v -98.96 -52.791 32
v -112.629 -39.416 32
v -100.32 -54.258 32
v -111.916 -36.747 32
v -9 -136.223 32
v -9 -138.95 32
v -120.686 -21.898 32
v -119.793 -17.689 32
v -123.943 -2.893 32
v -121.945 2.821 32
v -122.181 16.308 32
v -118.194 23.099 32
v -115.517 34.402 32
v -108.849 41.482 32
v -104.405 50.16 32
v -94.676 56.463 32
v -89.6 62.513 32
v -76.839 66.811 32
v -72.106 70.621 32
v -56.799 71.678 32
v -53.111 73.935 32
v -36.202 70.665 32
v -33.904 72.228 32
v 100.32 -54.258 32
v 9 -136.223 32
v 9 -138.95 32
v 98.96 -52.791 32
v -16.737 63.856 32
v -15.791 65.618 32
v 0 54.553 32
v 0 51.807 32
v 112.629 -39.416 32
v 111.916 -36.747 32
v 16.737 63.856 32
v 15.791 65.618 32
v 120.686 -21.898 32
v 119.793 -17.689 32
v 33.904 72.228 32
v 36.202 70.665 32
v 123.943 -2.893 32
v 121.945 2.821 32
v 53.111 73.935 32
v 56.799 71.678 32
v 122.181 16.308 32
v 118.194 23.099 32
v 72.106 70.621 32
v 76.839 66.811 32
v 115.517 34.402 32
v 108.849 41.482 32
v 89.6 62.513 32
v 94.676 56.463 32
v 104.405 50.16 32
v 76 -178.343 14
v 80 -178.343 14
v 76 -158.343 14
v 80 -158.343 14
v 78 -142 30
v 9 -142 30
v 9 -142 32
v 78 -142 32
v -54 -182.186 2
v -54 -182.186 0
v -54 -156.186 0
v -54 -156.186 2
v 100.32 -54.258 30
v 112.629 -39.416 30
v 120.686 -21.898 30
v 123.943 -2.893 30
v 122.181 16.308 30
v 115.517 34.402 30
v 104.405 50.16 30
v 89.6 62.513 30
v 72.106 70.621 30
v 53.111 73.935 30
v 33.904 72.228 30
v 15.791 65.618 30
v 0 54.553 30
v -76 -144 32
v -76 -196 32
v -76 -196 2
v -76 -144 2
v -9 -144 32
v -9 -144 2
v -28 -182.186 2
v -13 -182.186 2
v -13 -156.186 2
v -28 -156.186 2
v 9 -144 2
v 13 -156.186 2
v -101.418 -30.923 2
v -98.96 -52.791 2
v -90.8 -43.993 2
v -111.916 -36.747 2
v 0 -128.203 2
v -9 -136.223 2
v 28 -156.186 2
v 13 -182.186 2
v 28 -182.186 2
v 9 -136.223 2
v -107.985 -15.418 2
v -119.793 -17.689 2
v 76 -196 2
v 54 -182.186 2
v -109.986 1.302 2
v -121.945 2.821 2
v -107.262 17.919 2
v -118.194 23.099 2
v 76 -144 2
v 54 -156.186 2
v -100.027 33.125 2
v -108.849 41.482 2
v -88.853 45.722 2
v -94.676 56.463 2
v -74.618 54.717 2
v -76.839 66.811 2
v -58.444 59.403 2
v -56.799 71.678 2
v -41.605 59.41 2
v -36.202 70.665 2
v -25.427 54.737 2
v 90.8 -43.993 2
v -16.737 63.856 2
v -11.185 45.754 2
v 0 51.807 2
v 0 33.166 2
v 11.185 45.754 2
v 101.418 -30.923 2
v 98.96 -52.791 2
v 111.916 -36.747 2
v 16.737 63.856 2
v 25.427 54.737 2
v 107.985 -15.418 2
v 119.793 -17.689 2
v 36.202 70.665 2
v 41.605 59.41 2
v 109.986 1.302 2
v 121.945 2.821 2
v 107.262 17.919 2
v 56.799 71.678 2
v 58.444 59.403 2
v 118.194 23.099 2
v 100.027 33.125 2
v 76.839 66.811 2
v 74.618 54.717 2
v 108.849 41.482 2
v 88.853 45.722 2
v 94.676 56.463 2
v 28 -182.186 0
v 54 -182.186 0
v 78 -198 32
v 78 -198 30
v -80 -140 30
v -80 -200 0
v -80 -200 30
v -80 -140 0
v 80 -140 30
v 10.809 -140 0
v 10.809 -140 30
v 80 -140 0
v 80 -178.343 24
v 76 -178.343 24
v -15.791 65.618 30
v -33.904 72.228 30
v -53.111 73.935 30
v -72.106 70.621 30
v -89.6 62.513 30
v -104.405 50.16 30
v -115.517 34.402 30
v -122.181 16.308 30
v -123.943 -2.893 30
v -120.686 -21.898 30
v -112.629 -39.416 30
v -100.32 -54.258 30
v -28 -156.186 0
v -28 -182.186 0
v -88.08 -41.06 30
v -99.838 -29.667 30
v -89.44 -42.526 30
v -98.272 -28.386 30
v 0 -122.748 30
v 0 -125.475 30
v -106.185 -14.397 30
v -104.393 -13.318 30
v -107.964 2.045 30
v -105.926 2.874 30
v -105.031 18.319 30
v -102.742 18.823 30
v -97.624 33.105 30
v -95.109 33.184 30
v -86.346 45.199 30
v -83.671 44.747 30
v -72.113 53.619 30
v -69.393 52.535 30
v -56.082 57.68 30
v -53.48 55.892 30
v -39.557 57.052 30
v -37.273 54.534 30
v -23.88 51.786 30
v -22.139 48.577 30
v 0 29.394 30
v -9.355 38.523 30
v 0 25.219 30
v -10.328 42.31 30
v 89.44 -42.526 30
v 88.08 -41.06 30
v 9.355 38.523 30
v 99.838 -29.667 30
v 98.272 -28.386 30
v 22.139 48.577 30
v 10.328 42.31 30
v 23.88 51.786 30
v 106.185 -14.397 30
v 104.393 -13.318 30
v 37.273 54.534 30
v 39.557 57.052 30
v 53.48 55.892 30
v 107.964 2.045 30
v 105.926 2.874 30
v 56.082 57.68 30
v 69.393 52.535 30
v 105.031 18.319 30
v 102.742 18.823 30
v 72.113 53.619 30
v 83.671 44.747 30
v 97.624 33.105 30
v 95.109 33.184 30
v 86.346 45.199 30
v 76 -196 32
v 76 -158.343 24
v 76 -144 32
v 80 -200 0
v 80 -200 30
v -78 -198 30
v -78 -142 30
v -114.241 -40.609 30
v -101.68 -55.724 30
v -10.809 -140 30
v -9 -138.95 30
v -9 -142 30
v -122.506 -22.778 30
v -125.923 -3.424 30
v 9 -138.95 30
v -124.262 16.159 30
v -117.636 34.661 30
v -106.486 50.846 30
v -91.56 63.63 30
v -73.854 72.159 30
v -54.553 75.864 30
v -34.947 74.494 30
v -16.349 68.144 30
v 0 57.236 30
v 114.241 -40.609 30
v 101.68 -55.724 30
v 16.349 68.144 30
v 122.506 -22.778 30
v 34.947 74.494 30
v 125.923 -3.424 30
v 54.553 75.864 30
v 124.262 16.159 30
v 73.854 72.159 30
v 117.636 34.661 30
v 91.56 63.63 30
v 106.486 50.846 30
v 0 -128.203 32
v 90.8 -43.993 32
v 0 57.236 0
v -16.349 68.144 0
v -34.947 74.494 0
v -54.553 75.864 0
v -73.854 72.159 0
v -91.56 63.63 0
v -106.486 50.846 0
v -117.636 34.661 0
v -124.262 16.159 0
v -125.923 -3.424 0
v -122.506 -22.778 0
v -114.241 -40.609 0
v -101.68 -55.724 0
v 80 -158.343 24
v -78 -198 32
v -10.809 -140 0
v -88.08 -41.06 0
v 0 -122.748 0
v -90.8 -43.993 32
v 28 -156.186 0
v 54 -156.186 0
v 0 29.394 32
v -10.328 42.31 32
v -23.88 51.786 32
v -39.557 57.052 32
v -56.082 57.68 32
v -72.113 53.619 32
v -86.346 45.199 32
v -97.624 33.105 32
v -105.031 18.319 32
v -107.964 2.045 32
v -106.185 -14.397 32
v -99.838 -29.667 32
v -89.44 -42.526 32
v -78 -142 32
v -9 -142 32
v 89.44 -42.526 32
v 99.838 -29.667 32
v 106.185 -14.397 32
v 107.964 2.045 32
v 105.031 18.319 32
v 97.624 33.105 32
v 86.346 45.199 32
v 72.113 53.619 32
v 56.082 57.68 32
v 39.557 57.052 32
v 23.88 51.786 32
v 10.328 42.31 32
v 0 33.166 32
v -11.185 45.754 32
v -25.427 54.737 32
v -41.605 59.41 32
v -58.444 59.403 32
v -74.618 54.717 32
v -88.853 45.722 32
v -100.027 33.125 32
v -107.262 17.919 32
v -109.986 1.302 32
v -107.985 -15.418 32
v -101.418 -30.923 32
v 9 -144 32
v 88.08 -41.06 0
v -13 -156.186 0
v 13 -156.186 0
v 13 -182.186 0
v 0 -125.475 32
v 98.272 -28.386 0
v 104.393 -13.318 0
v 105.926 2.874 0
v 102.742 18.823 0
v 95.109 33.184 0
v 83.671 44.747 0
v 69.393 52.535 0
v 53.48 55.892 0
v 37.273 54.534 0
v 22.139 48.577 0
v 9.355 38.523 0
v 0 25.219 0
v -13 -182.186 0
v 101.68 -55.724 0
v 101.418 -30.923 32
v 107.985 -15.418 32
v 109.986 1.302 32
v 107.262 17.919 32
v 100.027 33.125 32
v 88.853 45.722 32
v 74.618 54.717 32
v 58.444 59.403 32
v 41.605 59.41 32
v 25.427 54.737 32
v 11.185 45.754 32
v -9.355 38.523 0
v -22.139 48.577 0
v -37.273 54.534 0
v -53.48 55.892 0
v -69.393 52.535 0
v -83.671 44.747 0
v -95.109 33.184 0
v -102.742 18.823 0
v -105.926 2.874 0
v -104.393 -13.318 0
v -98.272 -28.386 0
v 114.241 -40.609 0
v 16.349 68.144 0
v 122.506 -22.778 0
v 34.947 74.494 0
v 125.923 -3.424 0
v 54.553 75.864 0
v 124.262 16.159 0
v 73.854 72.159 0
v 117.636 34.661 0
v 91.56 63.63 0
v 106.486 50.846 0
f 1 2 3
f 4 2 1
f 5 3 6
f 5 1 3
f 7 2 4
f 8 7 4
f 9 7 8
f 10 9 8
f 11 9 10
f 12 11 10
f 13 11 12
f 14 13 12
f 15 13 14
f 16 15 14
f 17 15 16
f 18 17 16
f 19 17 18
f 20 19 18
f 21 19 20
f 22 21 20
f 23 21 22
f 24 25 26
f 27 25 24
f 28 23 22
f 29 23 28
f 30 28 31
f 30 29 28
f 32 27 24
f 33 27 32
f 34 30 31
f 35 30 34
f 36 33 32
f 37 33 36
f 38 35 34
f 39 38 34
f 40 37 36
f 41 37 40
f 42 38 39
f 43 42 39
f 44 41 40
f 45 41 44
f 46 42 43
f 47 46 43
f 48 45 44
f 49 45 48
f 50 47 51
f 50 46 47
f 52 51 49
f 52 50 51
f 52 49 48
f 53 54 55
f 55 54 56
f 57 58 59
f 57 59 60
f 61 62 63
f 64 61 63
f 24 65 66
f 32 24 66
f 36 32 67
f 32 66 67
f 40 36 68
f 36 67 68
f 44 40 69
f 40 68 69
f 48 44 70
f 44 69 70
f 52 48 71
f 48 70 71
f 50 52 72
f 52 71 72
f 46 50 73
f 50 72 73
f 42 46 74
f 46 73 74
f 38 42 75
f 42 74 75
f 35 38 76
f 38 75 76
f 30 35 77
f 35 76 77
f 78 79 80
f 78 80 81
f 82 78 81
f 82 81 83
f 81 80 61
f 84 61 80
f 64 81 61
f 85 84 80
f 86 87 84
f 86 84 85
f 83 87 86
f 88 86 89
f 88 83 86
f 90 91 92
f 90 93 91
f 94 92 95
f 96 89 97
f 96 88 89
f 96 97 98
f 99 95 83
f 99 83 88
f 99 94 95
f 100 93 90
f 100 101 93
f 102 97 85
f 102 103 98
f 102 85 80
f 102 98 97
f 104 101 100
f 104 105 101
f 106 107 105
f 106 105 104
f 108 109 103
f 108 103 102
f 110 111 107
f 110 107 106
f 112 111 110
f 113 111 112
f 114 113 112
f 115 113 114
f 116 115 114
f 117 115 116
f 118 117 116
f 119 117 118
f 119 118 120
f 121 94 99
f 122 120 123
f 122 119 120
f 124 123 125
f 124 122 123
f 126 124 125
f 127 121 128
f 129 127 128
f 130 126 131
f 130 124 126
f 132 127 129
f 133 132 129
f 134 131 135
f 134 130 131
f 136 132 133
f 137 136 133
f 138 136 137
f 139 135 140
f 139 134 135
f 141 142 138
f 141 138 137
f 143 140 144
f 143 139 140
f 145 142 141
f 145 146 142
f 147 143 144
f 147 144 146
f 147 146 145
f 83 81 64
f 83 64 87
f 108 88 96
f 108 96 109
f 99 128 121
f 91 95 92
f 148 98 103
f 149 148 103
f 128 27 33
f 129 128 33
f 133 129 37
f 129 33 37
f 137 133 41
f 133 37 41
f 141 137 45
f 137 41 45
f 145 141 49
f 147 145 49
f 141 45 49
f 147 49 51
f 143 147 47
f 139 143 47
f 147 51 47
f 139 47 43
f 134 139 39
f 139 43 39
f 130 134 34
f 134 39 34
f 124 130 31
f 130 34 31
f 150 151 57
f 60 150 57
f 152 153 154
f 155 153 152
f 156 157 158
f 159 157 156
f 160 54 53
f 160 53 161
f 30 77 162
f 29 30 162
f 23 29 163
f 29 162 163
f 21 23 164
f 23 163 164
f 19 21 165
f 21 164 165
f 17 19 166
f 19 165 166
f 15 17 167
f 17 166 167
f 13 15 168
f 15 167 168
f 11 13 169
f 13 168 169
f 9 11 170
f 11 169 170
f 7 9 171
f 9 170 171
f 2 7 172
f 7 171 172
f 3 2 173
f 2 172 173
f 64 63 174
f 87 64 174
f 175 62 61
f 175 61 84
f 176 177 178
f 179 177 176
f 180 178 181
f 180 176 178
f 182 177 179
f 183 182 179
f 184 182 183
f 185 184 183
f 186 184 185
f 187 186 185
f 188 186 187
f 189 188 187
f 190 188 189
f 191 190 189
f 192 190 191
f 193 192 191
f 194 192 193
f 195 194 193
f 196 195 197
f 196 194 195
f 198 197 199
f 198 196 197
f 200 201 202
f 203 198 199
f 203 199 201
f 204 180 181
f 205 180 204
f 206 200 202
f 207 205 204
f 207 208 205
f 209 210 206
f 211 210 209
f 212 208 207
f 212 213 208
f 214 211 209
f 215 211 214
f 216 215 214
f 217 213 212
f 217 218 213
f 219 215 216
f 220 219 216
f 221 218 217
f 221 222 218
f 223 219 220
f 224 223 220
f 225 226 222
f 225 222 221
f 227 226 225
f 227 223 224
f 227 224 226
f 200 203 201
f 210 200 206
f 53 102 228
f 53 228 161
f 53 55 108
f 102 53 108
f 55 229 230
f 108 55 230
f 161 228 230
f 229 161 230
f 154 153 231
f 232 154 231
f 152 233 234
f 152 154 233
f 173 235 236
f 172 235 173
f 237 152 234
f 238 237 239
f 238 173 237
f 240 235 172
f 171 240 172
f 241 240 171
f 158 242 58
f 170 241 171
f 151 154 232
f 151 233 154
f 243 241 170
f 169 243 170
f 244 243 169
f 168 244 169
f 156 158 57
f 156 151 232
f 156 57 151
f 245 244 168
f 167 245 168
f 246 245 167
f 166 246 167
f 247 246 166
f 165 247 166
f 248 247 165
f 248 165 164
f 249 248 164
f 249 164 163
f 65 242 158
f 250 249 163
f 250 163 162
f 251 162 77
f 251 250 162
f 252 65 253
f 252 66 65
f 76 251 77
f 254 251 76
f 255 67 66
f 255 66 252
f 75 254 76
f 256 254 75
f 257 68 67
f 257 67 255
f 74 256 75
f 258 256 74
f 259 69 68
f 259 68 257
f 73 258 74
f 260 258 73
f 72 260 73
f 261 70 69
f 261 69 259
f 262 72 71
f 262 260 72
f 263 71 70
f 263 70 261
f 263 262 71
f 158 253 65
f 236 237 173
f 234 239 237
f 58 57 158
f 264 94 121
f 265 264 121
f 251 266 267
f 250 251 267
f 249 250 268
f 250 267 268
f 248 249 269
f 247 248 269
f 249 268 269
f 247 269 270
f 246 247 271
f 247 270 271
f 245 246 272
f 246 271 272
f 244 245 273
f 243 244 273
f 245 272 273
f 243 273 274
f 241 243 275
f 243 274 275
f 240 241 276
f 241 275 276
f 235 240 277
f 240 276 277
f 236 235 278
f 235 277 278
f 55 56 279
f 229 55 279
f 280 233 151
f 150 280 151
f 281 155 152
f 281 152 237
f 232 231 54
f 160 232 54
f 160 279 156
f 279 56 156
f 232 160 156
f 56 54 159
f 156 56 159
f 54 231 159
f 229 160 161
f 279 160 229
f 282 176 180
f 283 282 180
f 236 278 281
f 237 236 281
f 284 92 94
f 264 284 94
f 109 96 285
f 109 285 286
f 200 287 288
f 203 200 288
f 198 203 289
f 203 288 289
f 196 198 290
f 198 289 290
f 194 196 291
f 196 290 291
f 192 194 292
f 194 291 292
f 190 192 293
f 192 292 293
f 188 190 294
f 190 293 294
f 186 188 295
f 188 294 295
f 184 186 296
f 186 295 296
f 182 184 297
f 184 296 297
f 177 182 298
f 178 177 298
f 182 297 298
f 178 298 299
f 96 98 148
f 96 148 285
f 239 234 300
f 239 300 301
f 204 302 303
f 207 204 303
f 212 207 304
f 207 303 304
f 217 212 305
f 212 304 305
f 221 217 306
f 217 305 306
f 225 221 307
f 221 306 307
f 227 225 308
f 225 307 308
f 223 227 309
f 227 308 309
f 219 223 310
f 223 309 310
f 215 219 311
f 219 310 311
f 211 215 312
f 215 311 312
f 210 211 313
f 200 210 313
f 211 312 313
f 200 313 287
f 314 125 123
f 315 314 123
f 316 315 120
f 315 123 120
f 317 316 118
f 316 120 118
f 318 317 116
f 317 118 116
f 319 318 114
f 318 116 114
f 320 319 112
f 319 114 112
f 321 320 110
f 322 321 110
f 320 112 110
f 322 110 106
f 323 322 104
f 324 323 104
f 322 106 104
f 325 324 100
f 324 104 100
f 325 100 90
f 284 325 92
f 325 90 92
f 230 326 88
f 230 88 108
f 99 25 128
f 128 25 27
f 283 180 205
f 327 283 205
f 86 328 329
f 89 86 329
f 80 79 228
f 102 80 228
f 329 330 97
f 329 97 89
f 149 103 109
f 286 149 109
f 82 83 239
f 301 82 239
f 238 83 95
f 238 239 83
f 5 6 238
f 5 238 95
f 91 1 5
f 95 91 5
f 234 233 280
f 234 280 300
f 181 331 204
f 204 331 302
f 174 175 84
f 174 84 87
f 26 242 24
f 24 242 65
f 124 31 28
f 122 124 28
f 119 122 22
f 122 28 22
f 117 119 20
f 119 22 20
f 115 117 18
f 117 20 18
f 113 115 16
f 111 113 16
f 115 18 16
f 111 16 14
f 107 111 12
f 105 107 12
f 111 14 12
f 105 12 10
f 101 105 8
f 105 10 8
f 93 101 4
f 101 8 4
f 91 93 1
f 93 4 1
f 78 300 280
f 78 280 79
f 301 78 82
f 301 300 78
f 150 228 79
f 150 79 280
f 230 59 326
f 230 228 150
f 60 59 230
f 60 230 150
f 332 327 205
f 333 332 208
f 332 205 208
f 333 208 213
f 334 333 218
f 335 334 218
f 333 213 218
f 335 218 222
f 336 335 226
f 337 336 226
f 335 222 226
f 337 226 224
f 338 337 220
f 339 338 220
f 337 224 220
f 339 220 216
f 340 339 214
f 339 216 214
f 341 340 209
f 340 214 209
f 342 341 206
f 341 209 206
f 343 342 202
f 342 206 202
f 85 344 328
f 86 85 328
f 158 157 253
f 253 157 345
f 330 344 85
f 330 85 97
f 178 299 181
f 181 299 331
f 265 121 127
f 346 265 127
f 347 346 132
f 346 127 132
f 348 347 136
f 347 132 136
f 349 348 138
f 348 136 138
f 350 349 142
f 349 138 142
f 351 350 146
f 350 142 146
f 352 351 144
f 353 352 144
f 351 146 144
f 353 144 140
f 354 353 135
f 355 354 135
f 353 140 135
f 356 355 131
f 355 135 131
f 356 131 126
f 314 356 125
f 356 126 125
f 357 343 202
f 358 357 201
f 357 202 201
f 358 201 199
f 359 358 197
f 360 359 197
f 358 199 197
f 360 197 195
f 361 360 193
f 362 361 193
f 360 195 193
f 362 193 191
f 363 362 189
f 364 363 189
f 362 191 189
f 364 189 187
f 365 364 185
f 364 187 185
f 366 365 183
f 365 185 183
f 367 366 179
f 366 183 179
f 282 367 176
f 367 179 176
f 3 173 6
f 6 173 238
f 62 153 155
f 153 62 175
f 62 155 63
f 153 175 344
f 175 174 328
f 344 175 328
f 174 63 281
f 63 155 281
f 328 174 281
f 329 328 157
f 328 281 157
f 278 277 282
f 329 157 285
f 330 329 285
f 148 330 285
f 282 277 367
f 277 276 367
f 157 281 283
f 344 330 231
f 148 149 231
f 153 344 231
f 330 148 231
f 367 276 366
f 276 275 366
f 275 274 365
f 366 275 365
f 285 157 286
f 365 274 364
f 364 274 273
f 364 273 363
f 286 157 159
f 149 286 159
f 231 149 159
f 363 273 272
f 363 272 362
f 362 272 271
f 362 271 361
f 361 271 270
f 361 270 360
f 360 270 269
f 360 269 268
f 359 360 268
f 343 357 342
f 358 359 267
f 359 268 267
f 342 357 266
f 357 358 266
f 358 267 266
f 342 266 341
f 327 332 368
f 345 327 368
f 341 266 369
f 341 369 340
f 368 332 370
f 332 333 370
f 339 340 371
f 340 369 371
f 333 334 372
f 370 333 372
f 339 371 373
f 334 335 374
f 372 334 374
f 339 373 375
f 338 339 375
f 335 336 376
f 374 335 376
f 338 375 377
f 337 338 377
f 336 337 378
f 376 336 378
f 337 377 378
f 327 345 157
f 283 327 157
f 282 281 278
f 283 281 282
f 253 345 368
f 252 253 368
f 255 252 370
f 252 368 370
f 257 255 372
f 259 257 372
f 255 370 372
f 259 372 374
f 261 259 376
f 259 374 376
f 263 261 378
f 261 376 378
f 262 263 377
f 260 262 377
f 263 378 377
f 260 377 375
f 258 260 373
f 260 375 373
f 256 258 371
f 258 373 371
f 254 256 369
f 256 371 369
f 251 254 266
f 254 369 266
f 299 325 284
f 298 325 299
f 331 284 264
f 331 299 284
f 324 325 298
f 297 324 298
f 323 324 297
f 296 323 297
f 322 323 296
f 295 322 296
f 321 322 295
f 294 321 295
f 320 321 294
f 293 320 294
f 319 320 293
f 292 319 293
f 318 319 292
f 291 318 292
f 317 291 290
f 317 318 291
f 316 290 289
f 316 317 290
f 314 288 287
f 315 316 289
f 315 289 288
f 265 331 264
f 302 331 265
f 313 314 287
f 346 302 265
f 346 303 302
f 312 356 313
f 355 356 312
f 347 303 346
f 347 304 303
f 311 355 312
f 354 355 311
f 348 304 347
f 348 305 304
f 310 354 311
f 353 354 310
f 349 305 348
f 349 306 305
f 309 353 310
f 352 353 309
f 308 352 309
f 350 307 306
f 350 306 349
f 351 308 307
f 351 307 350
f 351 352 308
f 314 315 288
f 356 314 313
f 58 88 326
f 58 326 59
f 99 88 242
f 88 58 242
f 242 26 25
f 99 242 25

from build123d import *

# Parameters (mm, degrees)
PAD_DEPTH       = 30
PAD003_DEPTH    = 32
POCKET_DEPTH    = 30
PAD004_DEPTH    = 32
POCKET004_DEPTH = 2
POCKET001_DEPTH = 32.001
SKETCH004_W     = 160
SKETCH004_H     = 60
PAD002_DEPTH    = 30
SKETCH005_W     = 156
SKETCH005_H     = 56
PAD005_DEPTH    = 32
SKETCH009_W     = 152
SKETCH009_H     = 52
POCKET006_DEPTH = 30
SKETCH006_W     = 18
SKETCH006_H     = 12
POCKET005_DEPTH = 30
SKETCH010_W     = 20
SKETCH010_H     = 10
POCKET007_DEPTH = 5
SKETCH011_W     = 26
SKETCH011_H     = 26
POCKET008_DEPTH = 2.5


with BuildPart() as part:
    # Sketch001 → Pad (new body)
    with BuildSketch(Plane.XY):
        with BuildLine():
            ThreePointArc((0, 57.236352), (-106.486482, 50.845622), (-101.68, -55.72412))
            Line((-101.68, -55.72412), (0, -150.0248))
            Line((0, -150.0248), (101.68, -55.72412))
            ThreePointArc((101.68, -55.72412), (106.486482, 50.845622), (0, 57.236352))
        make_face()
    extrude(amount=PAD_DEPTH)

    # Sketch002 → Pad003 (join)
    with BuildSketch(Plane.XY):
        with BuildLine():
            ThreePointArc((0, 54.552727), (-104.405447, 50.160217), (-100.32, -54.257696))
            Line((-100.32, -54.257696), (0, -147.297076))
            Line((0, -147.297076), (100.32, -54.257696))
            ThreePointArc((100.32, -54.257696), (104.405447, 50.160217), (0, 54.552727))
        make_face()
    extrude(amount=PAD003_DEPTH)

    # Sketch007 → Pocket (cut)
    with BuildSketch(Plane.XY.offset(32)):
        with BuildLine():
            ThreePointArc((0, 51.807335), (-102.301889, 49.482446), (-98.96, -52.791272))
            Line((-98.96, -52.791272), (0, -144.569352))
            Line((0, -144.569352), (98.96, -52.791272))
            ThreePointArc((98.96, -52.791272), (102.301889, 49.482446), (0, 51.807335))
        make_face()
    extrude(amount=-POCKET_DEPTH, mode=Mode.SUBTRACT)

    # Sketch008 → Pad004 (join)
    with BuildSketch(Plane.XY):
        with BuildLine():
            ThreePointArc((0, 33.166248), (-88.852758, 45.721583), (-90.8, -43.992727))
            Line((-90.8, -43.992727), (0, -128.203011))
            Line((0, -128.203011), (90.8, -43.992727))
            ThreePointArc((90.8, -43.992727), (88.852758, 45.721583), (0, 33.166248))
        make_face()
    extrude(amount=PAD004_DEPTH)

    # Sketch003 → Pocket004 (cut)
    with BuildSketch(Plane.XY.offset(32)):
        with BuildLine():
            ThreePointArc((0, 29.393877), (-86.345652, 45.199486), (-89.44, -42.526302))
            Line((-89.44, -42.526302), (0, -125.475287))
            Line((0, -125.475287), (89.44, -42.526302))
            ThreePointArc((89.44, -42.526302), (86.345652, 45.199486), (0, 29.393877))
        make_face()
    extrude(amount=-POCKET004_DEPTH, mode=Mode.SUBTRACT)

    # Sketch → Pocket001 (cut, through all)
    with BuildSketch(Plane.XY.offset(32)):
        with BuildLine():
            ThreePointArc((0, 25.21904), (-83.671135, 44.74656), (-88.08, -41.059878))
            Line((-88.08, -41.059878), (0, -122.747563))
            Line((0, -122.747563), (88.08, -41.059878))
            ThreePointArc((88.08, -41.059878), (83.671135, 44.74656), (0, 25.21904))
        make_face()
    extrude(amount=-POCKET001_DEPTH, mode=Mode.SUBTRACT)

    # Sketch004 → Pad002 (join)
    with BuildSketch(Plane.XY):
        with Locations((0, -170)):
            Rectangle(SKETCH004_W, SKETCH004_H)
    extrude(amount=PAD002_DEPTH)

    # Sketch005 → Pad005 (join)
    with BuildSketch(Plane.XY):
        with Locations((0, -170)):
            Rectangle(SKETCH005_W, SKETCH005_H)
    extrude(amount=PAD005_DEPTH)

    # Sketch009 → Pocket006 (cut)
    with BuildSketch(Plane.XY.offset(32)):
        with Locations((0, -170)):
            Rectangle(SKETCH009_W, SKETCH009_H)
    extrude(amount=-POCKET006_DEPTH, mode=Mode.SUBTRACT)

    # Sketch006 → Pocket005 (cut)
    with BuildSketch(Plane.XY.offset(32)):
        with Locations((0, -142.076699)):
            Rectangle(SKETCH006_W, SKETCH006_H)
    extrude(amount=-POCKET005_DEPTH, mode=Mode.SUBTRACT)

    # Sketch010 → Pocket007 (cut, symmetric)
    with BuildSketch(Plane.YZ.offset(80)):
        with Locations((-168.343253, 19)):
            Rectangle(SKETCH010_W, SKETCH010_H)
    extrude(amount=POCKET007_DEPTH, both=True, mode=Mode.SUBTRACT)

    # Sketch011 → Pocket008 (cut, symmetric)
    with BuildSketch(Plane.XY):
        with Locations((-41, -169.18593)):
            Rectangle(SKETCH011_W, SKETCH011_H)
        with Locations((0, -169.18593)):
            Rectangle(SKETCH011_W, SKETCH011_H)
        with Locations((41, -169.18593)):
            Rectangle(SKETCH011_W, SKETCH011_H)
    extrude(amount=POCKET008_DEPTH, both=True, mode=Mode.SUBTRACT)


solid = part.part
